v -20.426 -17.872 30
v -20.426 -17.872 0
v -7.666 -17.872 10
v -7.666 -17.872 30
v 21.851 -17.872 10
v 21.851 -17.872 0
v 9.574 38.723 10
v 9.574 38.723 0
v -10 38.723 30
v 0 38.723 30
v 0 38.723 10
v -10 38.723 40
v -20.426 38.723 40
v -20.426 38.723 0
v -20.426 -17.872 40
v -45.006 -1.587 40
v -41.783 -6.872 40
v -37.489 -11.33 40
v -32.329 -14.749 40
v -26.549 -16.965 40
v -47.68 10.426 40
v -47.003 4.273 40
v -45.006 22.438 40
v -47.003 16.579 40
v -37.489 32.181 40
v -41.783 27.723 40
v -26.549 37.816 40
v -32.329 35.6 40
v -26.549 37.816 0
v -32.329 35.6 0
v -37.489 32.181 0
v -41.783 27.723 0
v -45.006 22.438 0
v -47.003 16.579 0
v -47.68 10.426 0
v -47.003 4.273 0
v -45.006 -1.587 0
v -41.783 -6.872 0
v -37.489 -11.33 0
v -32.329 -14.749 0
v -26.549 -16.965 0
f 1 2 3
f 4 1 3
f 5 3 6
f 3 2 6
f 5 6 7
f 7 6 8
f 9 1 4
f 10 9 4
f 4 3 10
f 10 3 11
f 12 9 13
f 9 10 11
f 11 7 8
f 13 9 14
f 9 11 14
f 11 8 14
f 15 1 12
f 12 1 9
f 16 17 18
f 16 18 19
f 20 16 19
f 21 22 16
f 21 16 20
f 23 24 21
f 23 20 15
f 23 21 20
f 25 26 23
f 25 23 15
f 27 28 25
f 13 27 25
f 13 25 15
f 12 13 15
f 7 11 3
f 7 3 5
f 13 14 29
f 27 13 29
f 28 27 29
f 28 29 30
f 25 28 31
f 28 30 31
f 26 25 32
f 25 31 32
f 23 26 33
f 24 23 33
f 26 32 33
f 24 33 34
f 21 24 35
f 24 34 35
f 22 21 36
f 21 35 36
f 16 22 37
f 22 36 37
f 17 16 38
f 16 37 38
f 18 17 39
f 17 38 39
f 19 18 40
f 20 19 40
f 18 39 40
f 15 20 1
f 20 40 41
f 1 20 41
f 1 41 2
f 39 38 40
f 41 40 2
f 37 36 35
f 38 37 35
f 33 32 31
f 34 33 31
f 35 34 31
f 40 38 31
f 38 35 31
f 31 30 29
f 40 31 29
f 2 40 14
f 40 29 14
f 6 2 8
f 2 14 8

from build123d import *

# Parameters (mm, degrees)
F1_DEPTH = 10
F2_DEPTH = 30
F3_DEPTH = 40


with BuildPart() as f1:
    # F0 (on Top) → F1 (new body)
    with BuildSketch(Plane.XY):
        Polygon((21.850749, -17.87234), (9.574469, 38.723405), (0, 38.723405), (-7.665832, -17.87234), align=None)
    extrude(amount=F1_DEPTH)

    # F0 (on Top) → F2 (join)
    with BuildSketch(Plane.XY):
        Polygon((-7.665832, -17.87234), (0, 38.723405), (-10, 38.723405), (-20.425531, -17.87234), align=None)
    extrude(amount=F2_DEPTH)

    # F0 (on Top) → F3 (join)
    with BuildSketch(Plane.XY):
        with BuildLine():
            Line((-20.425531, -17.87234), (-10, 38.723405))
            Line((-10, 38.723405), (-20.425531, 38.723405))
            ThreePointArc((-20.425531, 38.723405), (-47.679565, 10.425532), (-20.425531, -17.87234))
        make_face()
    extrude(amount=F3_DEPTH)


solid = f1.part
